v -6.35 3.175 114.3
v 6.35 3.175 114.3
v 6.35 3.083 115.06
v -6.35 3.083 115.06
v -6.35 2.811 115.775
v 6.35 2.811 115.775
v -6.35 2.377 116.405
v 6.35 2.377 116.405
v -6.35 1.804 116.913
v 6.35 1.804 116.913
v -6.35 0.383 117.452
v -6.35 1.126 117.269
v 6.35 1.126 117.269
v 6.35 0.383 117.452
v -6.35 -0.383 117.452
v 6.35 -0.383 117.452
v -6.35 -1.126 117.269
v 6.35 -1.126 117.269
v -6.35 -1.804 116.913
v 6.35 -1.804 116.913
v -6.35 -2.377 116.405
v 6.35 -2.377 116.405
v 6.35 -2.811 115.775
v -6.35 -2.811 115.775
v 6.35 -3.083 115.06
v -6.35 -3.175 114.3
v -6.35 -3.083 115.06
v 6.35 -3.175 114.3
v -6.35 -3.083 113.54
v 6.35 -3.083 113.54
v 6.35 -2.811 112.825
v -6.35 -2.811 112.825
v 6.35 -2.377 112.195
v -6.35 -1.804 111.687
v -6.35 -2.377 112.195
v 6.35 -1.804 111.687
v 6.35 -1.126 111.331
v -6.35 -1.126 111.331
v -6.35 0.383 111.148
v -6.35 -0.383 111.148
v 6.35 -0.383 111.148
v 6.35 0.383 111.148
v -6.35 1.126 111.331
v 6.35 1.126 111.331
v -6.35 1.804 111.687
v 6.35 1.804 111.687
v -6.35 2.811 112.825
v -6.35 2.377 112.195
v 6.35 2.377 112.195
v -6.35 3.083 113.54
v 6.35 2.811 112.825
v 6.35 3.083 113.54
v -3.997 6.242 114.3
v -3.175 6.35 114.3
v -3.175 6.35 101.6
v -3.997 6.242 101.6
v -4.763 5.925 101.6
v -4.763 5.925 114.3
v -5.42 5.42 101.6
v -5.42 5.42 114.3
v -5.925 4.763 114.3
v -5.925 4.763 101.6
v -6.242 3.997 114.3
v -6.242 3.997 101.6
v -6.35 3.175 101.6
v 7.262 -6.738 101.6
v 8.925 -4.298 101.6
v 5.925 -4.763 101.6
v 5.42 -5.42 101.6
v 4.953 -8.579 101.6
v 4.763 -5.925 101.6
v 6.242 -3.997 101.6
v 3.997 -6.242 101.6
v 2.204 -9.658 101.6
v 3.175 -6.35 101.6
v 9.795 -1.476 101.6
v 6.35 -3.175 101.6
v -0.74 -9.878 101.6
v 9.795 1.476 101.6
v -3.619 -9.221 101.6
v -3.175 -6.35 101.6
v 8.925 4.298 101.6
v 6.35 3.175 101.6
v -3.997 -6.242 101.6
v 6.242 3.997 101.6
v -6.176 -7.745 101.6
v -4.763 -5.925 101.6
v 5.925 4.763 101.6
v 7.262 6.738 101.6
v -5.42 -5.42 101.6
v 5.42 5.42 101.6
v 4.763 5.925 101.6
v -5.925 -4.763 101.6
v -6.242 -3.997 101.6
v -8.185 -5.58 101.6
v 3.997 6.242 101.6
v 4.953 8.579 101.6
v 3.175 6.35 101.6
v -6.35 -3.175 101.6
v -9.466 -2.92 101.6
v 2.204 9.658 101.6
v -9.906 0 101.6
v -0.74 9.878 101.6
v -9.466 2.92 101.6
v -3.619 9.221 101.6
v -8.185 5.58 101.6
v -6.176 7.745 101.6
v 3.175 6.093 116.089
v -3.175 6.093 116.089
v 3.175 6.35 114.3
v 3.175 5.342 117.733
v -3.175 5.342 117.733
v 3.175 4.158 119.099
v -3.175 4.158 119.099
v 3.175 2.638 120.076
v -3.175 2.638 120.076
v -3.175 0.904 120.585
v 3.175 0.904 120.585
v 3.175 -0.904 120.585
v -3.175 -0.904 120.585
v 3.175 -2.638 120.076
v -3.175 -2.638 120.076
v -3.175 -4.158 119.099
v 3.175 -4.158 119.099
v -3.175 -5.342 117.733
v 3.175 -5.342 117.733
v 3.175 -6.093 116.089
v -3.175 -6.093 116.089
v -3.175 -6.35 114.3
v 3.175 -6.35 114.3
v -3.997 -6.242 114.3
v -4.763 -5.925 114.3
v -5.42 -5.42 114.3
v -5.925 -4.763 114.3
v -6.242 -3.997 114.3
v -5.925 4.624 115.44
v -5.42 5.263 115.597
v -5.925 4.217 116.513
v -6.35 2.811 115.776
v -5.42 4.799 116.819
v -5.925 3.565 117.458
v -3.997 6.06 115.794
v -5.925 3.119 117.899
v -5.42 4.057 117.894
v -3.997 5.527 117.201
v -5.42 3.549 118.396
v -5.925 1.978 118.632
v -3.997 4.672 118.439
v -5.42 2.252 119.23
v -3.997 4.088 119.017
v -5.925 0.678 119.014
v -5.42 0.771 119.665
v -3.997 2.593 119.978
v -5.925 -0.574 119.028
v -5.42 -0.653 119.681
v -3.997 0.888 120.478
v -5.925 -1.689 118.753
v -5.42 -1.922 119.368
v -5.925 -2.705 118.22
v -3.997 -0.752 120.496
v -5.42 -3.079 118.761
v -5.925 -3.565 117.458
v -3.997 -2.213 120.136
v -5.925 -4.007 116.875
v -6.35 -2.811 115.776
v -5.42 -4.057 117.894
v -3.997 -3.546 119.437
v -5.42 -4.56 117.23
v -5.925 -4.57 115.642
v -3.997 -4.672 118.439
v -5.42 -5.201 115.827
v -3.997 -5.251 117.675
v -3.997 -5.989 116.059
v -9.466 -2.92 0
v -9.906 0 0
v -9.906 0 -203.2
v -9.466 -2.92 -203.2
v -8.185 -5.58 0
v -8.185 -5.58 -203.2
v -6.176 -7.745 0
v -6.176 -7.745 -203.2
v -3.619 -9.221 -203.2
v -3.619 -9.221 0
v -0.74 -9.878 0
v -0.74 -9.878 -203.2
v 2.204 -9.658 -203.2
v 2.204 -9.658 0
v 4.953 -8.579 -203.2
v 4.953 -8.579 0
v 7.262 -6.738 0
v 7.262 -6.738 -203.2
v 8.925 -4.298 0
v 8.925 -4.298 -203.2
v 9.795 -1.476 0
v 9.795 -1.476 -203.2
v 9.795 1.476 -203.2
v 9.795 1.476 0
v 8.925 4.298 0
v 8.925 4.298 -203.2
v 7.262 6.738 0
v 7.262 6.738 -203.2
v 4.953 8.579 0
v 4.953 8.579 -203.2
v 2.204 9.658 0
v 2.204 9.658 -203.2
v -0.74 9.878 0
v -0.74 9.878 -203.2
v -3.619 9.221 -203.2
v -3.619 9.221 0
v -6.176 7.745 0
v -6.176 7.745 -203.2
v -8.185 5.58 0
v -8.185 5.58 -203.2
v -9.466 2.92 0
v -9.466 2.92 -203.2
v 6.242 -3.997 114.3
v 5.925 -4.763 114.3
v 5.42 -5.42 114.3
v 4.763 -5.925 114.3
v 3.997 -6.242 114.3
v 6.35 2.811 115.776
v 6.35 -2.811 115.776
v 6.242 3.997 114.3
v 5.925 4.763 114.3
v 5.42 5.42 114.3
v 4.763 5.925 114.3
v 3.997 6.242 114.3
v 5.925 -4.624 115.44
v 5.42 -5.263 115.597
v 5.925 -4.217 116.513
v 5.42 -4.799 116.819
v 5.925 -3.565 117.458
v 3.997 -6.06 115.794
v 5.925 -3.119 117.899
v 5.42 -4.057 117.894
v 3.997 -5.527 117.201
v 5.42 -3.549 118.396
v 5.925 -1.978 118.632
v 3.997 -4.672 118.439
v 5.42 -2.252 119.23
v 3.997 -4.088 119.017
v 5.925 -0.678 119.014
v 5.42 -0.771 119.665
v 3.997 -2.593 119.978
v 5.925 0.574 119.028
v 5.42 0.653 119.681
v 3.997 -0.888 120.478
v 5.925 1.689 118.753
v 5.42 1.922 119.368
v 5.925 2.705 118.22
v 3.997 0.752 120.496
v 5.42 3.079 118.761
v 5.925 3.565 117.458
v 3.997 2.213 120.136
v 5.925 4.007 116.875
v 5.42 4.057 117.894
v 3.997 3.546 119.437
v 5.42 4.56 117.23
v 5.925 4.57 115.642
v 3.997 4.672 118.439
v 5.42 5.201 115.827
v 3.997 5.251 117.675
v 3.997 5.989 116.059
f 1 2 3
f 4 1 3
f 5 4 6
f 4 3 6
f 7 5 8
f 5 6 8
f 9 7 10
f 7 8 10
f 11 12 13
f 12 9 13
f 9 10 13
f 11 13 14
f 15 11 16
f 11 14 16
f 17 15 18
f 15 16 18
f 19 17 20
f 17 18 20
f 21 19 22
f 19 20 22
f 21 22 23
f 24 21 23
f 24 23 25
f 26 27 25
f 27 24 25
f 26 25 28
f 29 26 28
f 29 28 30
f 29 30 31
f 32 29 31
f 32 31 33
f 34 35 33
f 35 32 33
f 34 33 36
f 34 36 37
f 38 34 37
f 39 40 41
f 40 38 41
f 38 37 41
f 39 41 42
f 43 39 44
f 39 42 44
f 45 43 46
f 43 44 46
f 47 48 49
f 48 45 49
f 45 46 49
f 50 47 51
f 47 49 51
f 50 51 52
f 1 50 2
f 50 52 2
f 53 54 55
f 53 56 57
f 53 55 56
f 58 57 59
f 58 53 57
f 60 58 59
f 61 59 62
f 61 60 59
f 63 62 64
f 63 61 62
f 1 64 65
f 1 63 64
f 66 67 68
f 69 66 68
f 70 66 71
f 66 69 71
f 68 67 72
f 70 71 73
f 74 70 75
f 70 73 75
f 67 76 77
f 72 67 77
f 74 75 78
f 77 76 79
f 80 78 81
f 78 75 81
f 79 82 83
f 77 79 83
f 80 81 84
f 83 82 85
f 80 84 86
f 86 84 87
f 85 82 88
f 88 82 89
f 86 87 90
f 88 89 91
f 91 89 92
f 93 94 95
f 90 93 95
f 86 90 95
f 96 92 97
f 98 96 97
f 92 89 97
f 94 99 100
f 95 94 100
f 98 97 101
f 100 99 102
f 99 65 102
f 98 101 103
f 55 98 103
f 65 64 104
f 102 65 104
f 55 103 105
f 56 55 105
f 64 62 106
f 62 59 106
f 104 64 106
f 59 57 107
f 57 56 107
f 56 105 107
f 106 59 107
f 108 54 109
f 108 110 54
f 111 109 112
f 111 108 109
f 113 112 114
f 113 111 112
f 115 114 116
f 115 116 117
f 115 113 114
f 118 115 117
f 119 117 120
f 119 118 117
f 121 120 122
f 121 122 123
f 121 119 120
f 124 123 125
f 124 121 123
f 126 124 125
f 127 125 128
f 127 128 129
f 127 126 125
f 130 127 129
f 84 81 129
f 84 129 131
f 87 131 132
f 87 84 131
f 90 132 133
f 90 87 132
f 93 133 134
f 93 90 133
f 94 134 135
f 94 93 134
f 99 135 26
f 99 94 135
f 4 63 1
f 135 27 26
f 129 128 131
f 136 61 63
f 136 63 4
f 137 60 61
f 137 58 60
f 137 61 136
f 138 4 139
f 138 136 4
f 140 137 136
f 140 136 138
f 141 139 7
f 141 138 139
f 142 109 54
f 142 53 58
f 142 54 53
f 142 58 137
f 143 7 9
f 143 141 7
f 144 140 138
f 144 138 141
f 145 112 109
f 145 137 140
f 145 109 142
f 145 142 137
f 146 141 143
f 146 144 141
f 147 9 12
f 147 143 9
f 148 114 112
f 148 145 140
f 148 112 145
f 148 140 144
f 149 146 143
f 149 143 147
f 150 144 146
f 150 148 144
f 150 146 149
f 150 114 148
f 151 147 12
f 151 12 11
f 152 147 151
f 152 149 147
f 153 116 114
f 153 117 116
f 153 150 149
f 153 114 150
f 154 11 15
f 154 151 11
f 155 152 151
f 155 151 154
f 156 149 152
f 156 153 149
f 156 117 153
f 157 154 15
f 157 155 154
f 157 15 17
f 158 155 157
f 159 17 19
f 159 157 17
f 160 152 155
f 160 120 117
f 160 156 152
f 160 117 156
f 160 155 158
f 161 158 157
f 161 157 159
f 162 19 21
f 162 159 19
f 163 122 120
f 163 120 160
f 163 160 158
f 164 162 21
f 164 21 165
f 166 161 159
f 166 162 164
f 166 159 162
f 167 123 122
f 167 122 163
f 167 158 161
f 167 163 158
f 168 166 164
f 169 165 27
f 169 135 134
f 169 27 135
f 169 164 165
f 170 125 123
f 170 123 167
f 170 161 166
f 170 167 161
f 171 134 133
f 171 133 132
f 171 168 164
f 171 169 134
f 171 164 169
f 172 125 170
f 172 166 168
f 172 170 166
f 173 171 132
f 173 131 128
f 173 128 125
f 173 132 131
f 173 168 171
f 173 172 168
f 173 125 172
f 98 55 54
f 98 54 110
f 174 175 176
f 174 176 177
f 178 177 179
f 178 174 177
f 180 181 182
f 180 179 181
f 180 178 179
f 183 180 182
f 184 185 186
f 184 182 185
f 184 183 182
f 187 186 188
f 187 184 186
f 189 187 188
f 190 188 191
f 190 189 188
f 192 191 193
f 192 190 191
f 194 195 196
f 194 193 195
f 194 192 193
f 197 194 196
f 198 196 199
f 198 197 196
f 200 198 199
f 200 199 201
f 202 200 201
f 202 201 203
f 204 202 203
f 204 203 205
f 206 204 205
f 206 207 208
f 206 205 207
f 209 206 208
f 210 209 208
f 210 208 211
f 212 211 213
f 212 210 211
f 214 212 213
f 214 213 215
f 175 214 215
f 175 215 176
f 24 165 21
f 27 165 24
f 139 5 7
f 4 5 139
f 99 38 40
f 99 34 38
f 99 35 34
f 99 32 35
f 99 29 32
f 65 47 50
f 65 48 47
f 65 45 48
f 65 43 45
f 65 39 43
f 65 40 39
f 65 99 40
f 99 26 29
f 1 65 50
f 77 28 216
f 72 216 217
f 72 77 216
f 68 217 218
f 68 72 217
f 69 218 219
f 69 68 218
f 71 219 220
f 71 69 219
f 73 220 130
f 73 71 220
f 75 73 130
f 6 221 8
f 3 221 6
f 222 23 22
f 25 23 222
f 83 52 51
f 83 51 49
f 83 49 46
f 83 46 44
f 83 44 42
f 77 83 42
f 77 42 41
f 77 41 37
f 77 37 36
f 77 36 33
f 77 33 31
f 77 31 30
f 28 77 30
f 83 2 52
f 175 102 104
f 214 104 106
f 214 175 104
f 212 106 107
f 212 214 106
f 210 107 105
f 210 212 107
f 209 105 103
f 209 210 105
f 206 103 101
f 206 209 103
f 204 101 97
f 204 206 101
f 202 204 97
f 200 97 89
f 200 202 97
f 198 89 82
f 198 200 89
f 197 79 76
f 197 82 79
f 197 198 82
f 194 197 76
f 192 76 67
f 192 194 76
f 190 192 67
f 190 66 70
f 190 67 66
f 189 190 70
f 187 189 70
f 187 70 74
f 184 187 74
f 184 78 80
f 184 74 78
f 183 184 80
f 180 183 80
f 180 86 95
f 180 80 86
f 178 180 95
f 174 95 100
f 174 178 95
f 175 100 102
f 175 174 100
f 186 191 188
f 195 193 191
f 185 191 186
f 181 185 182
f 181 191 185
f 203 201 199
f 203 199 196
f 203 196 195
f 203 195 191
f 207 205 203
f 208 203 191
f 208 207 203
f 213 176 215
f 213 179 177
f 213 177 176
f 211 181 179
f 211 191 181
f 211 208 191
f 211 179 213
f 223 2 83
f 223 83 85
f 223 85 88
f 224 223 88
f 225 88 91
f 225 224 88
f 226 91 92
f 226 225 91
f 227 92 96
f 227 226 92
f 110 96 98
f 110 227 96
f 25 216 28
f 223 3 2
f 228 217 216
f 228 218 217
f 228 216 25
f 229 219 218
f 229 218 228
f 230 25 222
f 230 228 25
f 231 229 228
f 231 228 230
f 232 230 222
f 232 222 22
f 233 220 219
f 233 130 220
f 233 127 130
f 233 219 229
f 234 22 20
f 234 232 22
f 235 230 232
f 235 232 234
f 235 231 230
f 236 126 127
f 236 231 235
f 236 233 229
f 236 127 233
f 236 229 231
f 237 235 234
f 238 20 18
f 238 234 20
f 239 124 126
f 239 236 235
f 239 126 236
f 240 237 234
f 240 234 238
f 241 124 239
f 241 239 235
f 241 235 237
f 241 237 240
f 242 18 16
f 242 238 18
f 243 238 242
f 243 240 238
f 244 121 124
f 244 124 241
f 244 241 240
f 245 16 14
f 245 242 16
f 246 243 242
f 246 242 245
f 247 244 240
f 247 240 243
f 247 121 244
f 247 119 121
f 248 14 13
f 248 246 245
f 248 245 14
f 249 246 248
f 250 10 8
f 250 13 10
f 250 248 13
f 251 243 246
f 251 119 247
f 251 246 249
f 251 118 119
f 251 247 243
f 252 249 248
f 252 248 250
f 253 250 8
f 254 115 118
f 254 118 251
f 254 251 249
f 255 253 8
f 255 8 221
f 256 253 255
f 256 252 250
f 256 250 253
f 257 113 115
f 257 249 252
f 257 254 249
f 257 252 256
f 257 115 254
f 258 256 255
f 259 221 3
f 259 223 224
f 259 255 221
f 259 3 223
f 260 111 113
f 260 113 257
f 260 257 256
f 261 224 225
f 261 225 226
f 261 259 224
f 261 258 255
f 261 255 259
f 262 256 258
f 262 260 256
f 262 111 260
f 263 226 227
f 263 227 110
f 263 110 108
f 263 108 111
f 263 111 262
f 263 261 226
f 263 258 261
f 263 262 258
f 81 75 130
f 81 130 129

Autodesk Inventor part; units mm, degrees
ref_plane "YZ Plane" through (0, 0, 0) normal (1, 0, 0) x (0, 1, 0)
ref_plane "XZ Plane" through (0, 0, 0) normal (0, 1, 0) x (-1, 0, 0)
ref_plane "XY Plane" through (0, 0, 0) normal (0, 0, 1) x (1, 0, 0)
sketch "Sketch1" plane through (0, 0, 0) normal (0, 0, 1) x (1, 0, 0)
  circle A0 centre (0, 0) radius 6.0688
extrude "Extrusion1" add sketch "Sketch1" along normal blind 101.6
sketch "Sketch2" plane through (0, 0, 101.6) normal (0, 0, 1) x (1, 0, 0)
  line L0 (-6.0688, 6.0688) -> (6.0688, 6.0688)
  line L1 (6.0688, 6.0688) -> (6.0688, -6.0688)
  line L2 (6.0688, -6.0688) -> (-6.0688, -6.0688)
  line L3 (-6.0688, -6.0688) -> (-6.0688, 6.0688)
extrude "Extrusion2" add sketch "Sketch2" along normal blind 12.7
sketch "Sketch3" plane through (6.0688, -6.0688, 101.6) normal (1, 0, 0) x (0, 0, -1)
  line L0 (-12.7, 12.1376) -> (-12.7, 0) projected
  circle A0 centre (-12.7, 6.0688) radius 3.175
  point P0 (101.6, 6.0688)
  dimension "d4" = 6.35
extrude "Extrusion3" cut sketch "Sketch3" against normal blind 12.7
sketch "Sketch4" plane through (6.0688, -6.0688, 101.6) normal (1, 0, 0) x (0, 0, -1)
  arc A0 (-12.7, 2.8938) -> (-12.7, 9.2438) centre (-12.7, 6.0688) ccw projected
  circle A1 centre (-12.7, 6.0688) radius 3.175
  circle A2 centre (-12.7, 6.0688) radius 6.0688
  point P0 (101.6, 6.0688)
extrude "Extrusion4" add sketch "Sketch4" against normal blind 12.7
sketch "Sketch5" plane through (-6.0688, 0, 101.6) normal (-1, 0, 0) x (0, 0, 1)
  arc A0 (12.7, 6.0688) -> (12.7, -6.0688) centre (12.7, 0) ccw projected
  line L0 (0, 6.0688) -> (12.7, 6.0688) projected
  line L1 (0, 0) -> (0, 6.0688) projected
  line L2 (0, -6.0688) -> (0, 0) projected
  line L3 (0, -6.0688) -> (12.7, -6.0688) projected
  line L4 (0, 6.0688) -> (38.3978, 6.0688)
  line L5 (38.3978, 6.0688) -> (38.3978, -6.0688)
  line L6 (38.3978, -6.0688) -> (0, -6.0688)
  line L7 (0, -6.0688) -> (0, 6.0688)
  point P0 (-101.6, 0)
extrude "Extrusion5" cut sketch "Sketch5" along normal blind 12.7 contours L4 L5 L6 A0
sketch "Sketch6" plane through (0, 0, 0) normal (0, 0, -1) x (-1, 0, 0)
  circle A0 centre (0, 0) radius 6.0688 projected
  line L0 (0, 0) -> (0, 3.175)
  line L1 (0, 3.175) -> (-3.175, 3.175)
  line L2 (-3.175, 3.175) -> (3.175, 3.175)
  line L3 (3.175, 3.175) -> (3.175, -3.175)
  line L4 (3.175, -3.175) -> (-3.175, -3.175)
  line L5 (-3.175, -3.175) -> (-3.175, 3.175)
  dimension "d11" = 3.175
  dimension "d12" = 3.175
  dimension "d13" = 6.35
  dimension "d14" = 6.35
extrude "Extrusion6" add sketch "Sketch6" along normal blind 12.7 contours L2 L3 L4 L5 L1
fillet "Fillet1" radius 3.175 6 edges at (6.0688, 6.0688, 107.95) (6.0688, 0, 120.3688) (6.0688, -6.0688, 107.95) (-6.0688, 6.0688, 107.95) (-6.0688, 0, 120.3688) (-6.0688, -6.0688, 107.95)
sketch "Sketch7" plane through (0, 0, 0) normal (0, 0, -1) x (-1, 0, 0)
  circle A0 centre (0, 0) radius 6.0688 projected
  circle A1 centre (0, 0) radius 9.906
  dimension "d18" = 19.812
extrude "Extrusion7" add sketch "Sketch7" against normal blind 101.6
sketch "Sketch8" plane through (0, 0, 101.6) normal (0, 0, 1) x (1, 0, 0)
  circle A0 centre (0, 0) radius 9.906 projected
extrude "Extrusion8" cut sketch "Sketch8" along normal blind 101.6
sketch "Sketch9" plane through (0, 0, 101.6) normal (0, 0, 1) x (1, 0, 0)
  circle A0 centre (0, 0) radius 9.906 projected
  circle A1 centre (0, 0) radius 6.35
  line L0 (-6.35, 6.35) -> (6.35, 6.35)
  line L1 (6.35, 6.35) -> (6.35, -6.35)
  line L2 (6.35, -6.35) -> (-6.35, -6.35)
  line L3 (-6.35, -6.35) -> (-6.35, 6.35)
  dimension "d23" = 12.7
extrude "Extrusion9" add sketch "Sketch9" along normal blind 12.7 contours A1 | L1 L2 A1 | A1 L0 L1 | A1 L3 L0 | L2 L3 A1
sketch "Sketch10" plane through (6.35, -6.35, 101.6) normal (1, 0, 0) x (0, 0, -1)
  line L0 (-12.7, 12.7) -> (-12.7, 0) projected
  circle A0 centre (-12.7, 6.35) radius 3.175
  point P0 (101.6, 6.35)
  dimension "d26" = 6.35
extrude "Extrusion10" cut sketch "Sketch10" against normal blind 12.7
sketch "Sketch11" plane through (6.35, -6.35, 101.6) normal (1, 0, 0) x (0, 0, -1)
  arc A0 (-12.7, 3.175) -> (-12.7, 9.525) centre (-12.7, 6.35) ccw projected
  circle A1 centre (-12.7, 6.35) radius 3.175
  circle A2 centre (-12.7, 6.35) radius 6.35
  point P0 (101.6, 6.35)
extrude "Extrusion11" add sketch "Sketch11" against normal blind 12.7
fillet "Fillet2" radius 3.175 6 edges at (6.35, 6.35, 107.95) (6.35, 0, 120.65) (6.35, -6.35, 107.95) (-6.35, 6.35, 107.95) (-6.35, 0, 120.65) (-6.35, -6.35, 107.95)
sketch "Sketch12" plane through (0, 0, -12.7) normal (0, 0, -1) x (-1, 0, 0)
  line L0 (3.175, 3.175) -> (3.175, -3.175) projected
  line L1 (-3.175, 3.175) -> (3.175, 3.175) projected
  line L2 (-3.175, -3.175) -> (-3.175, 3.175) projected
  line L3 (3.175, -3.175) -> (-3.175, -3.175) projected
  point P0 (0, 0)
extrude "Extrusion12" cut sketch "Sketch12" against normal blind 12.7
sketch "Sketch13" plane through (0, 0, 0) normal (0, 0, -1) x (-1, 0, 0)
  circle A0 centre (0, 0) radius 9.906 projected
extrude "Extrusion13" add sketch "Sketch13" along normal blind 203.2
properties part number "linac arm12in"
